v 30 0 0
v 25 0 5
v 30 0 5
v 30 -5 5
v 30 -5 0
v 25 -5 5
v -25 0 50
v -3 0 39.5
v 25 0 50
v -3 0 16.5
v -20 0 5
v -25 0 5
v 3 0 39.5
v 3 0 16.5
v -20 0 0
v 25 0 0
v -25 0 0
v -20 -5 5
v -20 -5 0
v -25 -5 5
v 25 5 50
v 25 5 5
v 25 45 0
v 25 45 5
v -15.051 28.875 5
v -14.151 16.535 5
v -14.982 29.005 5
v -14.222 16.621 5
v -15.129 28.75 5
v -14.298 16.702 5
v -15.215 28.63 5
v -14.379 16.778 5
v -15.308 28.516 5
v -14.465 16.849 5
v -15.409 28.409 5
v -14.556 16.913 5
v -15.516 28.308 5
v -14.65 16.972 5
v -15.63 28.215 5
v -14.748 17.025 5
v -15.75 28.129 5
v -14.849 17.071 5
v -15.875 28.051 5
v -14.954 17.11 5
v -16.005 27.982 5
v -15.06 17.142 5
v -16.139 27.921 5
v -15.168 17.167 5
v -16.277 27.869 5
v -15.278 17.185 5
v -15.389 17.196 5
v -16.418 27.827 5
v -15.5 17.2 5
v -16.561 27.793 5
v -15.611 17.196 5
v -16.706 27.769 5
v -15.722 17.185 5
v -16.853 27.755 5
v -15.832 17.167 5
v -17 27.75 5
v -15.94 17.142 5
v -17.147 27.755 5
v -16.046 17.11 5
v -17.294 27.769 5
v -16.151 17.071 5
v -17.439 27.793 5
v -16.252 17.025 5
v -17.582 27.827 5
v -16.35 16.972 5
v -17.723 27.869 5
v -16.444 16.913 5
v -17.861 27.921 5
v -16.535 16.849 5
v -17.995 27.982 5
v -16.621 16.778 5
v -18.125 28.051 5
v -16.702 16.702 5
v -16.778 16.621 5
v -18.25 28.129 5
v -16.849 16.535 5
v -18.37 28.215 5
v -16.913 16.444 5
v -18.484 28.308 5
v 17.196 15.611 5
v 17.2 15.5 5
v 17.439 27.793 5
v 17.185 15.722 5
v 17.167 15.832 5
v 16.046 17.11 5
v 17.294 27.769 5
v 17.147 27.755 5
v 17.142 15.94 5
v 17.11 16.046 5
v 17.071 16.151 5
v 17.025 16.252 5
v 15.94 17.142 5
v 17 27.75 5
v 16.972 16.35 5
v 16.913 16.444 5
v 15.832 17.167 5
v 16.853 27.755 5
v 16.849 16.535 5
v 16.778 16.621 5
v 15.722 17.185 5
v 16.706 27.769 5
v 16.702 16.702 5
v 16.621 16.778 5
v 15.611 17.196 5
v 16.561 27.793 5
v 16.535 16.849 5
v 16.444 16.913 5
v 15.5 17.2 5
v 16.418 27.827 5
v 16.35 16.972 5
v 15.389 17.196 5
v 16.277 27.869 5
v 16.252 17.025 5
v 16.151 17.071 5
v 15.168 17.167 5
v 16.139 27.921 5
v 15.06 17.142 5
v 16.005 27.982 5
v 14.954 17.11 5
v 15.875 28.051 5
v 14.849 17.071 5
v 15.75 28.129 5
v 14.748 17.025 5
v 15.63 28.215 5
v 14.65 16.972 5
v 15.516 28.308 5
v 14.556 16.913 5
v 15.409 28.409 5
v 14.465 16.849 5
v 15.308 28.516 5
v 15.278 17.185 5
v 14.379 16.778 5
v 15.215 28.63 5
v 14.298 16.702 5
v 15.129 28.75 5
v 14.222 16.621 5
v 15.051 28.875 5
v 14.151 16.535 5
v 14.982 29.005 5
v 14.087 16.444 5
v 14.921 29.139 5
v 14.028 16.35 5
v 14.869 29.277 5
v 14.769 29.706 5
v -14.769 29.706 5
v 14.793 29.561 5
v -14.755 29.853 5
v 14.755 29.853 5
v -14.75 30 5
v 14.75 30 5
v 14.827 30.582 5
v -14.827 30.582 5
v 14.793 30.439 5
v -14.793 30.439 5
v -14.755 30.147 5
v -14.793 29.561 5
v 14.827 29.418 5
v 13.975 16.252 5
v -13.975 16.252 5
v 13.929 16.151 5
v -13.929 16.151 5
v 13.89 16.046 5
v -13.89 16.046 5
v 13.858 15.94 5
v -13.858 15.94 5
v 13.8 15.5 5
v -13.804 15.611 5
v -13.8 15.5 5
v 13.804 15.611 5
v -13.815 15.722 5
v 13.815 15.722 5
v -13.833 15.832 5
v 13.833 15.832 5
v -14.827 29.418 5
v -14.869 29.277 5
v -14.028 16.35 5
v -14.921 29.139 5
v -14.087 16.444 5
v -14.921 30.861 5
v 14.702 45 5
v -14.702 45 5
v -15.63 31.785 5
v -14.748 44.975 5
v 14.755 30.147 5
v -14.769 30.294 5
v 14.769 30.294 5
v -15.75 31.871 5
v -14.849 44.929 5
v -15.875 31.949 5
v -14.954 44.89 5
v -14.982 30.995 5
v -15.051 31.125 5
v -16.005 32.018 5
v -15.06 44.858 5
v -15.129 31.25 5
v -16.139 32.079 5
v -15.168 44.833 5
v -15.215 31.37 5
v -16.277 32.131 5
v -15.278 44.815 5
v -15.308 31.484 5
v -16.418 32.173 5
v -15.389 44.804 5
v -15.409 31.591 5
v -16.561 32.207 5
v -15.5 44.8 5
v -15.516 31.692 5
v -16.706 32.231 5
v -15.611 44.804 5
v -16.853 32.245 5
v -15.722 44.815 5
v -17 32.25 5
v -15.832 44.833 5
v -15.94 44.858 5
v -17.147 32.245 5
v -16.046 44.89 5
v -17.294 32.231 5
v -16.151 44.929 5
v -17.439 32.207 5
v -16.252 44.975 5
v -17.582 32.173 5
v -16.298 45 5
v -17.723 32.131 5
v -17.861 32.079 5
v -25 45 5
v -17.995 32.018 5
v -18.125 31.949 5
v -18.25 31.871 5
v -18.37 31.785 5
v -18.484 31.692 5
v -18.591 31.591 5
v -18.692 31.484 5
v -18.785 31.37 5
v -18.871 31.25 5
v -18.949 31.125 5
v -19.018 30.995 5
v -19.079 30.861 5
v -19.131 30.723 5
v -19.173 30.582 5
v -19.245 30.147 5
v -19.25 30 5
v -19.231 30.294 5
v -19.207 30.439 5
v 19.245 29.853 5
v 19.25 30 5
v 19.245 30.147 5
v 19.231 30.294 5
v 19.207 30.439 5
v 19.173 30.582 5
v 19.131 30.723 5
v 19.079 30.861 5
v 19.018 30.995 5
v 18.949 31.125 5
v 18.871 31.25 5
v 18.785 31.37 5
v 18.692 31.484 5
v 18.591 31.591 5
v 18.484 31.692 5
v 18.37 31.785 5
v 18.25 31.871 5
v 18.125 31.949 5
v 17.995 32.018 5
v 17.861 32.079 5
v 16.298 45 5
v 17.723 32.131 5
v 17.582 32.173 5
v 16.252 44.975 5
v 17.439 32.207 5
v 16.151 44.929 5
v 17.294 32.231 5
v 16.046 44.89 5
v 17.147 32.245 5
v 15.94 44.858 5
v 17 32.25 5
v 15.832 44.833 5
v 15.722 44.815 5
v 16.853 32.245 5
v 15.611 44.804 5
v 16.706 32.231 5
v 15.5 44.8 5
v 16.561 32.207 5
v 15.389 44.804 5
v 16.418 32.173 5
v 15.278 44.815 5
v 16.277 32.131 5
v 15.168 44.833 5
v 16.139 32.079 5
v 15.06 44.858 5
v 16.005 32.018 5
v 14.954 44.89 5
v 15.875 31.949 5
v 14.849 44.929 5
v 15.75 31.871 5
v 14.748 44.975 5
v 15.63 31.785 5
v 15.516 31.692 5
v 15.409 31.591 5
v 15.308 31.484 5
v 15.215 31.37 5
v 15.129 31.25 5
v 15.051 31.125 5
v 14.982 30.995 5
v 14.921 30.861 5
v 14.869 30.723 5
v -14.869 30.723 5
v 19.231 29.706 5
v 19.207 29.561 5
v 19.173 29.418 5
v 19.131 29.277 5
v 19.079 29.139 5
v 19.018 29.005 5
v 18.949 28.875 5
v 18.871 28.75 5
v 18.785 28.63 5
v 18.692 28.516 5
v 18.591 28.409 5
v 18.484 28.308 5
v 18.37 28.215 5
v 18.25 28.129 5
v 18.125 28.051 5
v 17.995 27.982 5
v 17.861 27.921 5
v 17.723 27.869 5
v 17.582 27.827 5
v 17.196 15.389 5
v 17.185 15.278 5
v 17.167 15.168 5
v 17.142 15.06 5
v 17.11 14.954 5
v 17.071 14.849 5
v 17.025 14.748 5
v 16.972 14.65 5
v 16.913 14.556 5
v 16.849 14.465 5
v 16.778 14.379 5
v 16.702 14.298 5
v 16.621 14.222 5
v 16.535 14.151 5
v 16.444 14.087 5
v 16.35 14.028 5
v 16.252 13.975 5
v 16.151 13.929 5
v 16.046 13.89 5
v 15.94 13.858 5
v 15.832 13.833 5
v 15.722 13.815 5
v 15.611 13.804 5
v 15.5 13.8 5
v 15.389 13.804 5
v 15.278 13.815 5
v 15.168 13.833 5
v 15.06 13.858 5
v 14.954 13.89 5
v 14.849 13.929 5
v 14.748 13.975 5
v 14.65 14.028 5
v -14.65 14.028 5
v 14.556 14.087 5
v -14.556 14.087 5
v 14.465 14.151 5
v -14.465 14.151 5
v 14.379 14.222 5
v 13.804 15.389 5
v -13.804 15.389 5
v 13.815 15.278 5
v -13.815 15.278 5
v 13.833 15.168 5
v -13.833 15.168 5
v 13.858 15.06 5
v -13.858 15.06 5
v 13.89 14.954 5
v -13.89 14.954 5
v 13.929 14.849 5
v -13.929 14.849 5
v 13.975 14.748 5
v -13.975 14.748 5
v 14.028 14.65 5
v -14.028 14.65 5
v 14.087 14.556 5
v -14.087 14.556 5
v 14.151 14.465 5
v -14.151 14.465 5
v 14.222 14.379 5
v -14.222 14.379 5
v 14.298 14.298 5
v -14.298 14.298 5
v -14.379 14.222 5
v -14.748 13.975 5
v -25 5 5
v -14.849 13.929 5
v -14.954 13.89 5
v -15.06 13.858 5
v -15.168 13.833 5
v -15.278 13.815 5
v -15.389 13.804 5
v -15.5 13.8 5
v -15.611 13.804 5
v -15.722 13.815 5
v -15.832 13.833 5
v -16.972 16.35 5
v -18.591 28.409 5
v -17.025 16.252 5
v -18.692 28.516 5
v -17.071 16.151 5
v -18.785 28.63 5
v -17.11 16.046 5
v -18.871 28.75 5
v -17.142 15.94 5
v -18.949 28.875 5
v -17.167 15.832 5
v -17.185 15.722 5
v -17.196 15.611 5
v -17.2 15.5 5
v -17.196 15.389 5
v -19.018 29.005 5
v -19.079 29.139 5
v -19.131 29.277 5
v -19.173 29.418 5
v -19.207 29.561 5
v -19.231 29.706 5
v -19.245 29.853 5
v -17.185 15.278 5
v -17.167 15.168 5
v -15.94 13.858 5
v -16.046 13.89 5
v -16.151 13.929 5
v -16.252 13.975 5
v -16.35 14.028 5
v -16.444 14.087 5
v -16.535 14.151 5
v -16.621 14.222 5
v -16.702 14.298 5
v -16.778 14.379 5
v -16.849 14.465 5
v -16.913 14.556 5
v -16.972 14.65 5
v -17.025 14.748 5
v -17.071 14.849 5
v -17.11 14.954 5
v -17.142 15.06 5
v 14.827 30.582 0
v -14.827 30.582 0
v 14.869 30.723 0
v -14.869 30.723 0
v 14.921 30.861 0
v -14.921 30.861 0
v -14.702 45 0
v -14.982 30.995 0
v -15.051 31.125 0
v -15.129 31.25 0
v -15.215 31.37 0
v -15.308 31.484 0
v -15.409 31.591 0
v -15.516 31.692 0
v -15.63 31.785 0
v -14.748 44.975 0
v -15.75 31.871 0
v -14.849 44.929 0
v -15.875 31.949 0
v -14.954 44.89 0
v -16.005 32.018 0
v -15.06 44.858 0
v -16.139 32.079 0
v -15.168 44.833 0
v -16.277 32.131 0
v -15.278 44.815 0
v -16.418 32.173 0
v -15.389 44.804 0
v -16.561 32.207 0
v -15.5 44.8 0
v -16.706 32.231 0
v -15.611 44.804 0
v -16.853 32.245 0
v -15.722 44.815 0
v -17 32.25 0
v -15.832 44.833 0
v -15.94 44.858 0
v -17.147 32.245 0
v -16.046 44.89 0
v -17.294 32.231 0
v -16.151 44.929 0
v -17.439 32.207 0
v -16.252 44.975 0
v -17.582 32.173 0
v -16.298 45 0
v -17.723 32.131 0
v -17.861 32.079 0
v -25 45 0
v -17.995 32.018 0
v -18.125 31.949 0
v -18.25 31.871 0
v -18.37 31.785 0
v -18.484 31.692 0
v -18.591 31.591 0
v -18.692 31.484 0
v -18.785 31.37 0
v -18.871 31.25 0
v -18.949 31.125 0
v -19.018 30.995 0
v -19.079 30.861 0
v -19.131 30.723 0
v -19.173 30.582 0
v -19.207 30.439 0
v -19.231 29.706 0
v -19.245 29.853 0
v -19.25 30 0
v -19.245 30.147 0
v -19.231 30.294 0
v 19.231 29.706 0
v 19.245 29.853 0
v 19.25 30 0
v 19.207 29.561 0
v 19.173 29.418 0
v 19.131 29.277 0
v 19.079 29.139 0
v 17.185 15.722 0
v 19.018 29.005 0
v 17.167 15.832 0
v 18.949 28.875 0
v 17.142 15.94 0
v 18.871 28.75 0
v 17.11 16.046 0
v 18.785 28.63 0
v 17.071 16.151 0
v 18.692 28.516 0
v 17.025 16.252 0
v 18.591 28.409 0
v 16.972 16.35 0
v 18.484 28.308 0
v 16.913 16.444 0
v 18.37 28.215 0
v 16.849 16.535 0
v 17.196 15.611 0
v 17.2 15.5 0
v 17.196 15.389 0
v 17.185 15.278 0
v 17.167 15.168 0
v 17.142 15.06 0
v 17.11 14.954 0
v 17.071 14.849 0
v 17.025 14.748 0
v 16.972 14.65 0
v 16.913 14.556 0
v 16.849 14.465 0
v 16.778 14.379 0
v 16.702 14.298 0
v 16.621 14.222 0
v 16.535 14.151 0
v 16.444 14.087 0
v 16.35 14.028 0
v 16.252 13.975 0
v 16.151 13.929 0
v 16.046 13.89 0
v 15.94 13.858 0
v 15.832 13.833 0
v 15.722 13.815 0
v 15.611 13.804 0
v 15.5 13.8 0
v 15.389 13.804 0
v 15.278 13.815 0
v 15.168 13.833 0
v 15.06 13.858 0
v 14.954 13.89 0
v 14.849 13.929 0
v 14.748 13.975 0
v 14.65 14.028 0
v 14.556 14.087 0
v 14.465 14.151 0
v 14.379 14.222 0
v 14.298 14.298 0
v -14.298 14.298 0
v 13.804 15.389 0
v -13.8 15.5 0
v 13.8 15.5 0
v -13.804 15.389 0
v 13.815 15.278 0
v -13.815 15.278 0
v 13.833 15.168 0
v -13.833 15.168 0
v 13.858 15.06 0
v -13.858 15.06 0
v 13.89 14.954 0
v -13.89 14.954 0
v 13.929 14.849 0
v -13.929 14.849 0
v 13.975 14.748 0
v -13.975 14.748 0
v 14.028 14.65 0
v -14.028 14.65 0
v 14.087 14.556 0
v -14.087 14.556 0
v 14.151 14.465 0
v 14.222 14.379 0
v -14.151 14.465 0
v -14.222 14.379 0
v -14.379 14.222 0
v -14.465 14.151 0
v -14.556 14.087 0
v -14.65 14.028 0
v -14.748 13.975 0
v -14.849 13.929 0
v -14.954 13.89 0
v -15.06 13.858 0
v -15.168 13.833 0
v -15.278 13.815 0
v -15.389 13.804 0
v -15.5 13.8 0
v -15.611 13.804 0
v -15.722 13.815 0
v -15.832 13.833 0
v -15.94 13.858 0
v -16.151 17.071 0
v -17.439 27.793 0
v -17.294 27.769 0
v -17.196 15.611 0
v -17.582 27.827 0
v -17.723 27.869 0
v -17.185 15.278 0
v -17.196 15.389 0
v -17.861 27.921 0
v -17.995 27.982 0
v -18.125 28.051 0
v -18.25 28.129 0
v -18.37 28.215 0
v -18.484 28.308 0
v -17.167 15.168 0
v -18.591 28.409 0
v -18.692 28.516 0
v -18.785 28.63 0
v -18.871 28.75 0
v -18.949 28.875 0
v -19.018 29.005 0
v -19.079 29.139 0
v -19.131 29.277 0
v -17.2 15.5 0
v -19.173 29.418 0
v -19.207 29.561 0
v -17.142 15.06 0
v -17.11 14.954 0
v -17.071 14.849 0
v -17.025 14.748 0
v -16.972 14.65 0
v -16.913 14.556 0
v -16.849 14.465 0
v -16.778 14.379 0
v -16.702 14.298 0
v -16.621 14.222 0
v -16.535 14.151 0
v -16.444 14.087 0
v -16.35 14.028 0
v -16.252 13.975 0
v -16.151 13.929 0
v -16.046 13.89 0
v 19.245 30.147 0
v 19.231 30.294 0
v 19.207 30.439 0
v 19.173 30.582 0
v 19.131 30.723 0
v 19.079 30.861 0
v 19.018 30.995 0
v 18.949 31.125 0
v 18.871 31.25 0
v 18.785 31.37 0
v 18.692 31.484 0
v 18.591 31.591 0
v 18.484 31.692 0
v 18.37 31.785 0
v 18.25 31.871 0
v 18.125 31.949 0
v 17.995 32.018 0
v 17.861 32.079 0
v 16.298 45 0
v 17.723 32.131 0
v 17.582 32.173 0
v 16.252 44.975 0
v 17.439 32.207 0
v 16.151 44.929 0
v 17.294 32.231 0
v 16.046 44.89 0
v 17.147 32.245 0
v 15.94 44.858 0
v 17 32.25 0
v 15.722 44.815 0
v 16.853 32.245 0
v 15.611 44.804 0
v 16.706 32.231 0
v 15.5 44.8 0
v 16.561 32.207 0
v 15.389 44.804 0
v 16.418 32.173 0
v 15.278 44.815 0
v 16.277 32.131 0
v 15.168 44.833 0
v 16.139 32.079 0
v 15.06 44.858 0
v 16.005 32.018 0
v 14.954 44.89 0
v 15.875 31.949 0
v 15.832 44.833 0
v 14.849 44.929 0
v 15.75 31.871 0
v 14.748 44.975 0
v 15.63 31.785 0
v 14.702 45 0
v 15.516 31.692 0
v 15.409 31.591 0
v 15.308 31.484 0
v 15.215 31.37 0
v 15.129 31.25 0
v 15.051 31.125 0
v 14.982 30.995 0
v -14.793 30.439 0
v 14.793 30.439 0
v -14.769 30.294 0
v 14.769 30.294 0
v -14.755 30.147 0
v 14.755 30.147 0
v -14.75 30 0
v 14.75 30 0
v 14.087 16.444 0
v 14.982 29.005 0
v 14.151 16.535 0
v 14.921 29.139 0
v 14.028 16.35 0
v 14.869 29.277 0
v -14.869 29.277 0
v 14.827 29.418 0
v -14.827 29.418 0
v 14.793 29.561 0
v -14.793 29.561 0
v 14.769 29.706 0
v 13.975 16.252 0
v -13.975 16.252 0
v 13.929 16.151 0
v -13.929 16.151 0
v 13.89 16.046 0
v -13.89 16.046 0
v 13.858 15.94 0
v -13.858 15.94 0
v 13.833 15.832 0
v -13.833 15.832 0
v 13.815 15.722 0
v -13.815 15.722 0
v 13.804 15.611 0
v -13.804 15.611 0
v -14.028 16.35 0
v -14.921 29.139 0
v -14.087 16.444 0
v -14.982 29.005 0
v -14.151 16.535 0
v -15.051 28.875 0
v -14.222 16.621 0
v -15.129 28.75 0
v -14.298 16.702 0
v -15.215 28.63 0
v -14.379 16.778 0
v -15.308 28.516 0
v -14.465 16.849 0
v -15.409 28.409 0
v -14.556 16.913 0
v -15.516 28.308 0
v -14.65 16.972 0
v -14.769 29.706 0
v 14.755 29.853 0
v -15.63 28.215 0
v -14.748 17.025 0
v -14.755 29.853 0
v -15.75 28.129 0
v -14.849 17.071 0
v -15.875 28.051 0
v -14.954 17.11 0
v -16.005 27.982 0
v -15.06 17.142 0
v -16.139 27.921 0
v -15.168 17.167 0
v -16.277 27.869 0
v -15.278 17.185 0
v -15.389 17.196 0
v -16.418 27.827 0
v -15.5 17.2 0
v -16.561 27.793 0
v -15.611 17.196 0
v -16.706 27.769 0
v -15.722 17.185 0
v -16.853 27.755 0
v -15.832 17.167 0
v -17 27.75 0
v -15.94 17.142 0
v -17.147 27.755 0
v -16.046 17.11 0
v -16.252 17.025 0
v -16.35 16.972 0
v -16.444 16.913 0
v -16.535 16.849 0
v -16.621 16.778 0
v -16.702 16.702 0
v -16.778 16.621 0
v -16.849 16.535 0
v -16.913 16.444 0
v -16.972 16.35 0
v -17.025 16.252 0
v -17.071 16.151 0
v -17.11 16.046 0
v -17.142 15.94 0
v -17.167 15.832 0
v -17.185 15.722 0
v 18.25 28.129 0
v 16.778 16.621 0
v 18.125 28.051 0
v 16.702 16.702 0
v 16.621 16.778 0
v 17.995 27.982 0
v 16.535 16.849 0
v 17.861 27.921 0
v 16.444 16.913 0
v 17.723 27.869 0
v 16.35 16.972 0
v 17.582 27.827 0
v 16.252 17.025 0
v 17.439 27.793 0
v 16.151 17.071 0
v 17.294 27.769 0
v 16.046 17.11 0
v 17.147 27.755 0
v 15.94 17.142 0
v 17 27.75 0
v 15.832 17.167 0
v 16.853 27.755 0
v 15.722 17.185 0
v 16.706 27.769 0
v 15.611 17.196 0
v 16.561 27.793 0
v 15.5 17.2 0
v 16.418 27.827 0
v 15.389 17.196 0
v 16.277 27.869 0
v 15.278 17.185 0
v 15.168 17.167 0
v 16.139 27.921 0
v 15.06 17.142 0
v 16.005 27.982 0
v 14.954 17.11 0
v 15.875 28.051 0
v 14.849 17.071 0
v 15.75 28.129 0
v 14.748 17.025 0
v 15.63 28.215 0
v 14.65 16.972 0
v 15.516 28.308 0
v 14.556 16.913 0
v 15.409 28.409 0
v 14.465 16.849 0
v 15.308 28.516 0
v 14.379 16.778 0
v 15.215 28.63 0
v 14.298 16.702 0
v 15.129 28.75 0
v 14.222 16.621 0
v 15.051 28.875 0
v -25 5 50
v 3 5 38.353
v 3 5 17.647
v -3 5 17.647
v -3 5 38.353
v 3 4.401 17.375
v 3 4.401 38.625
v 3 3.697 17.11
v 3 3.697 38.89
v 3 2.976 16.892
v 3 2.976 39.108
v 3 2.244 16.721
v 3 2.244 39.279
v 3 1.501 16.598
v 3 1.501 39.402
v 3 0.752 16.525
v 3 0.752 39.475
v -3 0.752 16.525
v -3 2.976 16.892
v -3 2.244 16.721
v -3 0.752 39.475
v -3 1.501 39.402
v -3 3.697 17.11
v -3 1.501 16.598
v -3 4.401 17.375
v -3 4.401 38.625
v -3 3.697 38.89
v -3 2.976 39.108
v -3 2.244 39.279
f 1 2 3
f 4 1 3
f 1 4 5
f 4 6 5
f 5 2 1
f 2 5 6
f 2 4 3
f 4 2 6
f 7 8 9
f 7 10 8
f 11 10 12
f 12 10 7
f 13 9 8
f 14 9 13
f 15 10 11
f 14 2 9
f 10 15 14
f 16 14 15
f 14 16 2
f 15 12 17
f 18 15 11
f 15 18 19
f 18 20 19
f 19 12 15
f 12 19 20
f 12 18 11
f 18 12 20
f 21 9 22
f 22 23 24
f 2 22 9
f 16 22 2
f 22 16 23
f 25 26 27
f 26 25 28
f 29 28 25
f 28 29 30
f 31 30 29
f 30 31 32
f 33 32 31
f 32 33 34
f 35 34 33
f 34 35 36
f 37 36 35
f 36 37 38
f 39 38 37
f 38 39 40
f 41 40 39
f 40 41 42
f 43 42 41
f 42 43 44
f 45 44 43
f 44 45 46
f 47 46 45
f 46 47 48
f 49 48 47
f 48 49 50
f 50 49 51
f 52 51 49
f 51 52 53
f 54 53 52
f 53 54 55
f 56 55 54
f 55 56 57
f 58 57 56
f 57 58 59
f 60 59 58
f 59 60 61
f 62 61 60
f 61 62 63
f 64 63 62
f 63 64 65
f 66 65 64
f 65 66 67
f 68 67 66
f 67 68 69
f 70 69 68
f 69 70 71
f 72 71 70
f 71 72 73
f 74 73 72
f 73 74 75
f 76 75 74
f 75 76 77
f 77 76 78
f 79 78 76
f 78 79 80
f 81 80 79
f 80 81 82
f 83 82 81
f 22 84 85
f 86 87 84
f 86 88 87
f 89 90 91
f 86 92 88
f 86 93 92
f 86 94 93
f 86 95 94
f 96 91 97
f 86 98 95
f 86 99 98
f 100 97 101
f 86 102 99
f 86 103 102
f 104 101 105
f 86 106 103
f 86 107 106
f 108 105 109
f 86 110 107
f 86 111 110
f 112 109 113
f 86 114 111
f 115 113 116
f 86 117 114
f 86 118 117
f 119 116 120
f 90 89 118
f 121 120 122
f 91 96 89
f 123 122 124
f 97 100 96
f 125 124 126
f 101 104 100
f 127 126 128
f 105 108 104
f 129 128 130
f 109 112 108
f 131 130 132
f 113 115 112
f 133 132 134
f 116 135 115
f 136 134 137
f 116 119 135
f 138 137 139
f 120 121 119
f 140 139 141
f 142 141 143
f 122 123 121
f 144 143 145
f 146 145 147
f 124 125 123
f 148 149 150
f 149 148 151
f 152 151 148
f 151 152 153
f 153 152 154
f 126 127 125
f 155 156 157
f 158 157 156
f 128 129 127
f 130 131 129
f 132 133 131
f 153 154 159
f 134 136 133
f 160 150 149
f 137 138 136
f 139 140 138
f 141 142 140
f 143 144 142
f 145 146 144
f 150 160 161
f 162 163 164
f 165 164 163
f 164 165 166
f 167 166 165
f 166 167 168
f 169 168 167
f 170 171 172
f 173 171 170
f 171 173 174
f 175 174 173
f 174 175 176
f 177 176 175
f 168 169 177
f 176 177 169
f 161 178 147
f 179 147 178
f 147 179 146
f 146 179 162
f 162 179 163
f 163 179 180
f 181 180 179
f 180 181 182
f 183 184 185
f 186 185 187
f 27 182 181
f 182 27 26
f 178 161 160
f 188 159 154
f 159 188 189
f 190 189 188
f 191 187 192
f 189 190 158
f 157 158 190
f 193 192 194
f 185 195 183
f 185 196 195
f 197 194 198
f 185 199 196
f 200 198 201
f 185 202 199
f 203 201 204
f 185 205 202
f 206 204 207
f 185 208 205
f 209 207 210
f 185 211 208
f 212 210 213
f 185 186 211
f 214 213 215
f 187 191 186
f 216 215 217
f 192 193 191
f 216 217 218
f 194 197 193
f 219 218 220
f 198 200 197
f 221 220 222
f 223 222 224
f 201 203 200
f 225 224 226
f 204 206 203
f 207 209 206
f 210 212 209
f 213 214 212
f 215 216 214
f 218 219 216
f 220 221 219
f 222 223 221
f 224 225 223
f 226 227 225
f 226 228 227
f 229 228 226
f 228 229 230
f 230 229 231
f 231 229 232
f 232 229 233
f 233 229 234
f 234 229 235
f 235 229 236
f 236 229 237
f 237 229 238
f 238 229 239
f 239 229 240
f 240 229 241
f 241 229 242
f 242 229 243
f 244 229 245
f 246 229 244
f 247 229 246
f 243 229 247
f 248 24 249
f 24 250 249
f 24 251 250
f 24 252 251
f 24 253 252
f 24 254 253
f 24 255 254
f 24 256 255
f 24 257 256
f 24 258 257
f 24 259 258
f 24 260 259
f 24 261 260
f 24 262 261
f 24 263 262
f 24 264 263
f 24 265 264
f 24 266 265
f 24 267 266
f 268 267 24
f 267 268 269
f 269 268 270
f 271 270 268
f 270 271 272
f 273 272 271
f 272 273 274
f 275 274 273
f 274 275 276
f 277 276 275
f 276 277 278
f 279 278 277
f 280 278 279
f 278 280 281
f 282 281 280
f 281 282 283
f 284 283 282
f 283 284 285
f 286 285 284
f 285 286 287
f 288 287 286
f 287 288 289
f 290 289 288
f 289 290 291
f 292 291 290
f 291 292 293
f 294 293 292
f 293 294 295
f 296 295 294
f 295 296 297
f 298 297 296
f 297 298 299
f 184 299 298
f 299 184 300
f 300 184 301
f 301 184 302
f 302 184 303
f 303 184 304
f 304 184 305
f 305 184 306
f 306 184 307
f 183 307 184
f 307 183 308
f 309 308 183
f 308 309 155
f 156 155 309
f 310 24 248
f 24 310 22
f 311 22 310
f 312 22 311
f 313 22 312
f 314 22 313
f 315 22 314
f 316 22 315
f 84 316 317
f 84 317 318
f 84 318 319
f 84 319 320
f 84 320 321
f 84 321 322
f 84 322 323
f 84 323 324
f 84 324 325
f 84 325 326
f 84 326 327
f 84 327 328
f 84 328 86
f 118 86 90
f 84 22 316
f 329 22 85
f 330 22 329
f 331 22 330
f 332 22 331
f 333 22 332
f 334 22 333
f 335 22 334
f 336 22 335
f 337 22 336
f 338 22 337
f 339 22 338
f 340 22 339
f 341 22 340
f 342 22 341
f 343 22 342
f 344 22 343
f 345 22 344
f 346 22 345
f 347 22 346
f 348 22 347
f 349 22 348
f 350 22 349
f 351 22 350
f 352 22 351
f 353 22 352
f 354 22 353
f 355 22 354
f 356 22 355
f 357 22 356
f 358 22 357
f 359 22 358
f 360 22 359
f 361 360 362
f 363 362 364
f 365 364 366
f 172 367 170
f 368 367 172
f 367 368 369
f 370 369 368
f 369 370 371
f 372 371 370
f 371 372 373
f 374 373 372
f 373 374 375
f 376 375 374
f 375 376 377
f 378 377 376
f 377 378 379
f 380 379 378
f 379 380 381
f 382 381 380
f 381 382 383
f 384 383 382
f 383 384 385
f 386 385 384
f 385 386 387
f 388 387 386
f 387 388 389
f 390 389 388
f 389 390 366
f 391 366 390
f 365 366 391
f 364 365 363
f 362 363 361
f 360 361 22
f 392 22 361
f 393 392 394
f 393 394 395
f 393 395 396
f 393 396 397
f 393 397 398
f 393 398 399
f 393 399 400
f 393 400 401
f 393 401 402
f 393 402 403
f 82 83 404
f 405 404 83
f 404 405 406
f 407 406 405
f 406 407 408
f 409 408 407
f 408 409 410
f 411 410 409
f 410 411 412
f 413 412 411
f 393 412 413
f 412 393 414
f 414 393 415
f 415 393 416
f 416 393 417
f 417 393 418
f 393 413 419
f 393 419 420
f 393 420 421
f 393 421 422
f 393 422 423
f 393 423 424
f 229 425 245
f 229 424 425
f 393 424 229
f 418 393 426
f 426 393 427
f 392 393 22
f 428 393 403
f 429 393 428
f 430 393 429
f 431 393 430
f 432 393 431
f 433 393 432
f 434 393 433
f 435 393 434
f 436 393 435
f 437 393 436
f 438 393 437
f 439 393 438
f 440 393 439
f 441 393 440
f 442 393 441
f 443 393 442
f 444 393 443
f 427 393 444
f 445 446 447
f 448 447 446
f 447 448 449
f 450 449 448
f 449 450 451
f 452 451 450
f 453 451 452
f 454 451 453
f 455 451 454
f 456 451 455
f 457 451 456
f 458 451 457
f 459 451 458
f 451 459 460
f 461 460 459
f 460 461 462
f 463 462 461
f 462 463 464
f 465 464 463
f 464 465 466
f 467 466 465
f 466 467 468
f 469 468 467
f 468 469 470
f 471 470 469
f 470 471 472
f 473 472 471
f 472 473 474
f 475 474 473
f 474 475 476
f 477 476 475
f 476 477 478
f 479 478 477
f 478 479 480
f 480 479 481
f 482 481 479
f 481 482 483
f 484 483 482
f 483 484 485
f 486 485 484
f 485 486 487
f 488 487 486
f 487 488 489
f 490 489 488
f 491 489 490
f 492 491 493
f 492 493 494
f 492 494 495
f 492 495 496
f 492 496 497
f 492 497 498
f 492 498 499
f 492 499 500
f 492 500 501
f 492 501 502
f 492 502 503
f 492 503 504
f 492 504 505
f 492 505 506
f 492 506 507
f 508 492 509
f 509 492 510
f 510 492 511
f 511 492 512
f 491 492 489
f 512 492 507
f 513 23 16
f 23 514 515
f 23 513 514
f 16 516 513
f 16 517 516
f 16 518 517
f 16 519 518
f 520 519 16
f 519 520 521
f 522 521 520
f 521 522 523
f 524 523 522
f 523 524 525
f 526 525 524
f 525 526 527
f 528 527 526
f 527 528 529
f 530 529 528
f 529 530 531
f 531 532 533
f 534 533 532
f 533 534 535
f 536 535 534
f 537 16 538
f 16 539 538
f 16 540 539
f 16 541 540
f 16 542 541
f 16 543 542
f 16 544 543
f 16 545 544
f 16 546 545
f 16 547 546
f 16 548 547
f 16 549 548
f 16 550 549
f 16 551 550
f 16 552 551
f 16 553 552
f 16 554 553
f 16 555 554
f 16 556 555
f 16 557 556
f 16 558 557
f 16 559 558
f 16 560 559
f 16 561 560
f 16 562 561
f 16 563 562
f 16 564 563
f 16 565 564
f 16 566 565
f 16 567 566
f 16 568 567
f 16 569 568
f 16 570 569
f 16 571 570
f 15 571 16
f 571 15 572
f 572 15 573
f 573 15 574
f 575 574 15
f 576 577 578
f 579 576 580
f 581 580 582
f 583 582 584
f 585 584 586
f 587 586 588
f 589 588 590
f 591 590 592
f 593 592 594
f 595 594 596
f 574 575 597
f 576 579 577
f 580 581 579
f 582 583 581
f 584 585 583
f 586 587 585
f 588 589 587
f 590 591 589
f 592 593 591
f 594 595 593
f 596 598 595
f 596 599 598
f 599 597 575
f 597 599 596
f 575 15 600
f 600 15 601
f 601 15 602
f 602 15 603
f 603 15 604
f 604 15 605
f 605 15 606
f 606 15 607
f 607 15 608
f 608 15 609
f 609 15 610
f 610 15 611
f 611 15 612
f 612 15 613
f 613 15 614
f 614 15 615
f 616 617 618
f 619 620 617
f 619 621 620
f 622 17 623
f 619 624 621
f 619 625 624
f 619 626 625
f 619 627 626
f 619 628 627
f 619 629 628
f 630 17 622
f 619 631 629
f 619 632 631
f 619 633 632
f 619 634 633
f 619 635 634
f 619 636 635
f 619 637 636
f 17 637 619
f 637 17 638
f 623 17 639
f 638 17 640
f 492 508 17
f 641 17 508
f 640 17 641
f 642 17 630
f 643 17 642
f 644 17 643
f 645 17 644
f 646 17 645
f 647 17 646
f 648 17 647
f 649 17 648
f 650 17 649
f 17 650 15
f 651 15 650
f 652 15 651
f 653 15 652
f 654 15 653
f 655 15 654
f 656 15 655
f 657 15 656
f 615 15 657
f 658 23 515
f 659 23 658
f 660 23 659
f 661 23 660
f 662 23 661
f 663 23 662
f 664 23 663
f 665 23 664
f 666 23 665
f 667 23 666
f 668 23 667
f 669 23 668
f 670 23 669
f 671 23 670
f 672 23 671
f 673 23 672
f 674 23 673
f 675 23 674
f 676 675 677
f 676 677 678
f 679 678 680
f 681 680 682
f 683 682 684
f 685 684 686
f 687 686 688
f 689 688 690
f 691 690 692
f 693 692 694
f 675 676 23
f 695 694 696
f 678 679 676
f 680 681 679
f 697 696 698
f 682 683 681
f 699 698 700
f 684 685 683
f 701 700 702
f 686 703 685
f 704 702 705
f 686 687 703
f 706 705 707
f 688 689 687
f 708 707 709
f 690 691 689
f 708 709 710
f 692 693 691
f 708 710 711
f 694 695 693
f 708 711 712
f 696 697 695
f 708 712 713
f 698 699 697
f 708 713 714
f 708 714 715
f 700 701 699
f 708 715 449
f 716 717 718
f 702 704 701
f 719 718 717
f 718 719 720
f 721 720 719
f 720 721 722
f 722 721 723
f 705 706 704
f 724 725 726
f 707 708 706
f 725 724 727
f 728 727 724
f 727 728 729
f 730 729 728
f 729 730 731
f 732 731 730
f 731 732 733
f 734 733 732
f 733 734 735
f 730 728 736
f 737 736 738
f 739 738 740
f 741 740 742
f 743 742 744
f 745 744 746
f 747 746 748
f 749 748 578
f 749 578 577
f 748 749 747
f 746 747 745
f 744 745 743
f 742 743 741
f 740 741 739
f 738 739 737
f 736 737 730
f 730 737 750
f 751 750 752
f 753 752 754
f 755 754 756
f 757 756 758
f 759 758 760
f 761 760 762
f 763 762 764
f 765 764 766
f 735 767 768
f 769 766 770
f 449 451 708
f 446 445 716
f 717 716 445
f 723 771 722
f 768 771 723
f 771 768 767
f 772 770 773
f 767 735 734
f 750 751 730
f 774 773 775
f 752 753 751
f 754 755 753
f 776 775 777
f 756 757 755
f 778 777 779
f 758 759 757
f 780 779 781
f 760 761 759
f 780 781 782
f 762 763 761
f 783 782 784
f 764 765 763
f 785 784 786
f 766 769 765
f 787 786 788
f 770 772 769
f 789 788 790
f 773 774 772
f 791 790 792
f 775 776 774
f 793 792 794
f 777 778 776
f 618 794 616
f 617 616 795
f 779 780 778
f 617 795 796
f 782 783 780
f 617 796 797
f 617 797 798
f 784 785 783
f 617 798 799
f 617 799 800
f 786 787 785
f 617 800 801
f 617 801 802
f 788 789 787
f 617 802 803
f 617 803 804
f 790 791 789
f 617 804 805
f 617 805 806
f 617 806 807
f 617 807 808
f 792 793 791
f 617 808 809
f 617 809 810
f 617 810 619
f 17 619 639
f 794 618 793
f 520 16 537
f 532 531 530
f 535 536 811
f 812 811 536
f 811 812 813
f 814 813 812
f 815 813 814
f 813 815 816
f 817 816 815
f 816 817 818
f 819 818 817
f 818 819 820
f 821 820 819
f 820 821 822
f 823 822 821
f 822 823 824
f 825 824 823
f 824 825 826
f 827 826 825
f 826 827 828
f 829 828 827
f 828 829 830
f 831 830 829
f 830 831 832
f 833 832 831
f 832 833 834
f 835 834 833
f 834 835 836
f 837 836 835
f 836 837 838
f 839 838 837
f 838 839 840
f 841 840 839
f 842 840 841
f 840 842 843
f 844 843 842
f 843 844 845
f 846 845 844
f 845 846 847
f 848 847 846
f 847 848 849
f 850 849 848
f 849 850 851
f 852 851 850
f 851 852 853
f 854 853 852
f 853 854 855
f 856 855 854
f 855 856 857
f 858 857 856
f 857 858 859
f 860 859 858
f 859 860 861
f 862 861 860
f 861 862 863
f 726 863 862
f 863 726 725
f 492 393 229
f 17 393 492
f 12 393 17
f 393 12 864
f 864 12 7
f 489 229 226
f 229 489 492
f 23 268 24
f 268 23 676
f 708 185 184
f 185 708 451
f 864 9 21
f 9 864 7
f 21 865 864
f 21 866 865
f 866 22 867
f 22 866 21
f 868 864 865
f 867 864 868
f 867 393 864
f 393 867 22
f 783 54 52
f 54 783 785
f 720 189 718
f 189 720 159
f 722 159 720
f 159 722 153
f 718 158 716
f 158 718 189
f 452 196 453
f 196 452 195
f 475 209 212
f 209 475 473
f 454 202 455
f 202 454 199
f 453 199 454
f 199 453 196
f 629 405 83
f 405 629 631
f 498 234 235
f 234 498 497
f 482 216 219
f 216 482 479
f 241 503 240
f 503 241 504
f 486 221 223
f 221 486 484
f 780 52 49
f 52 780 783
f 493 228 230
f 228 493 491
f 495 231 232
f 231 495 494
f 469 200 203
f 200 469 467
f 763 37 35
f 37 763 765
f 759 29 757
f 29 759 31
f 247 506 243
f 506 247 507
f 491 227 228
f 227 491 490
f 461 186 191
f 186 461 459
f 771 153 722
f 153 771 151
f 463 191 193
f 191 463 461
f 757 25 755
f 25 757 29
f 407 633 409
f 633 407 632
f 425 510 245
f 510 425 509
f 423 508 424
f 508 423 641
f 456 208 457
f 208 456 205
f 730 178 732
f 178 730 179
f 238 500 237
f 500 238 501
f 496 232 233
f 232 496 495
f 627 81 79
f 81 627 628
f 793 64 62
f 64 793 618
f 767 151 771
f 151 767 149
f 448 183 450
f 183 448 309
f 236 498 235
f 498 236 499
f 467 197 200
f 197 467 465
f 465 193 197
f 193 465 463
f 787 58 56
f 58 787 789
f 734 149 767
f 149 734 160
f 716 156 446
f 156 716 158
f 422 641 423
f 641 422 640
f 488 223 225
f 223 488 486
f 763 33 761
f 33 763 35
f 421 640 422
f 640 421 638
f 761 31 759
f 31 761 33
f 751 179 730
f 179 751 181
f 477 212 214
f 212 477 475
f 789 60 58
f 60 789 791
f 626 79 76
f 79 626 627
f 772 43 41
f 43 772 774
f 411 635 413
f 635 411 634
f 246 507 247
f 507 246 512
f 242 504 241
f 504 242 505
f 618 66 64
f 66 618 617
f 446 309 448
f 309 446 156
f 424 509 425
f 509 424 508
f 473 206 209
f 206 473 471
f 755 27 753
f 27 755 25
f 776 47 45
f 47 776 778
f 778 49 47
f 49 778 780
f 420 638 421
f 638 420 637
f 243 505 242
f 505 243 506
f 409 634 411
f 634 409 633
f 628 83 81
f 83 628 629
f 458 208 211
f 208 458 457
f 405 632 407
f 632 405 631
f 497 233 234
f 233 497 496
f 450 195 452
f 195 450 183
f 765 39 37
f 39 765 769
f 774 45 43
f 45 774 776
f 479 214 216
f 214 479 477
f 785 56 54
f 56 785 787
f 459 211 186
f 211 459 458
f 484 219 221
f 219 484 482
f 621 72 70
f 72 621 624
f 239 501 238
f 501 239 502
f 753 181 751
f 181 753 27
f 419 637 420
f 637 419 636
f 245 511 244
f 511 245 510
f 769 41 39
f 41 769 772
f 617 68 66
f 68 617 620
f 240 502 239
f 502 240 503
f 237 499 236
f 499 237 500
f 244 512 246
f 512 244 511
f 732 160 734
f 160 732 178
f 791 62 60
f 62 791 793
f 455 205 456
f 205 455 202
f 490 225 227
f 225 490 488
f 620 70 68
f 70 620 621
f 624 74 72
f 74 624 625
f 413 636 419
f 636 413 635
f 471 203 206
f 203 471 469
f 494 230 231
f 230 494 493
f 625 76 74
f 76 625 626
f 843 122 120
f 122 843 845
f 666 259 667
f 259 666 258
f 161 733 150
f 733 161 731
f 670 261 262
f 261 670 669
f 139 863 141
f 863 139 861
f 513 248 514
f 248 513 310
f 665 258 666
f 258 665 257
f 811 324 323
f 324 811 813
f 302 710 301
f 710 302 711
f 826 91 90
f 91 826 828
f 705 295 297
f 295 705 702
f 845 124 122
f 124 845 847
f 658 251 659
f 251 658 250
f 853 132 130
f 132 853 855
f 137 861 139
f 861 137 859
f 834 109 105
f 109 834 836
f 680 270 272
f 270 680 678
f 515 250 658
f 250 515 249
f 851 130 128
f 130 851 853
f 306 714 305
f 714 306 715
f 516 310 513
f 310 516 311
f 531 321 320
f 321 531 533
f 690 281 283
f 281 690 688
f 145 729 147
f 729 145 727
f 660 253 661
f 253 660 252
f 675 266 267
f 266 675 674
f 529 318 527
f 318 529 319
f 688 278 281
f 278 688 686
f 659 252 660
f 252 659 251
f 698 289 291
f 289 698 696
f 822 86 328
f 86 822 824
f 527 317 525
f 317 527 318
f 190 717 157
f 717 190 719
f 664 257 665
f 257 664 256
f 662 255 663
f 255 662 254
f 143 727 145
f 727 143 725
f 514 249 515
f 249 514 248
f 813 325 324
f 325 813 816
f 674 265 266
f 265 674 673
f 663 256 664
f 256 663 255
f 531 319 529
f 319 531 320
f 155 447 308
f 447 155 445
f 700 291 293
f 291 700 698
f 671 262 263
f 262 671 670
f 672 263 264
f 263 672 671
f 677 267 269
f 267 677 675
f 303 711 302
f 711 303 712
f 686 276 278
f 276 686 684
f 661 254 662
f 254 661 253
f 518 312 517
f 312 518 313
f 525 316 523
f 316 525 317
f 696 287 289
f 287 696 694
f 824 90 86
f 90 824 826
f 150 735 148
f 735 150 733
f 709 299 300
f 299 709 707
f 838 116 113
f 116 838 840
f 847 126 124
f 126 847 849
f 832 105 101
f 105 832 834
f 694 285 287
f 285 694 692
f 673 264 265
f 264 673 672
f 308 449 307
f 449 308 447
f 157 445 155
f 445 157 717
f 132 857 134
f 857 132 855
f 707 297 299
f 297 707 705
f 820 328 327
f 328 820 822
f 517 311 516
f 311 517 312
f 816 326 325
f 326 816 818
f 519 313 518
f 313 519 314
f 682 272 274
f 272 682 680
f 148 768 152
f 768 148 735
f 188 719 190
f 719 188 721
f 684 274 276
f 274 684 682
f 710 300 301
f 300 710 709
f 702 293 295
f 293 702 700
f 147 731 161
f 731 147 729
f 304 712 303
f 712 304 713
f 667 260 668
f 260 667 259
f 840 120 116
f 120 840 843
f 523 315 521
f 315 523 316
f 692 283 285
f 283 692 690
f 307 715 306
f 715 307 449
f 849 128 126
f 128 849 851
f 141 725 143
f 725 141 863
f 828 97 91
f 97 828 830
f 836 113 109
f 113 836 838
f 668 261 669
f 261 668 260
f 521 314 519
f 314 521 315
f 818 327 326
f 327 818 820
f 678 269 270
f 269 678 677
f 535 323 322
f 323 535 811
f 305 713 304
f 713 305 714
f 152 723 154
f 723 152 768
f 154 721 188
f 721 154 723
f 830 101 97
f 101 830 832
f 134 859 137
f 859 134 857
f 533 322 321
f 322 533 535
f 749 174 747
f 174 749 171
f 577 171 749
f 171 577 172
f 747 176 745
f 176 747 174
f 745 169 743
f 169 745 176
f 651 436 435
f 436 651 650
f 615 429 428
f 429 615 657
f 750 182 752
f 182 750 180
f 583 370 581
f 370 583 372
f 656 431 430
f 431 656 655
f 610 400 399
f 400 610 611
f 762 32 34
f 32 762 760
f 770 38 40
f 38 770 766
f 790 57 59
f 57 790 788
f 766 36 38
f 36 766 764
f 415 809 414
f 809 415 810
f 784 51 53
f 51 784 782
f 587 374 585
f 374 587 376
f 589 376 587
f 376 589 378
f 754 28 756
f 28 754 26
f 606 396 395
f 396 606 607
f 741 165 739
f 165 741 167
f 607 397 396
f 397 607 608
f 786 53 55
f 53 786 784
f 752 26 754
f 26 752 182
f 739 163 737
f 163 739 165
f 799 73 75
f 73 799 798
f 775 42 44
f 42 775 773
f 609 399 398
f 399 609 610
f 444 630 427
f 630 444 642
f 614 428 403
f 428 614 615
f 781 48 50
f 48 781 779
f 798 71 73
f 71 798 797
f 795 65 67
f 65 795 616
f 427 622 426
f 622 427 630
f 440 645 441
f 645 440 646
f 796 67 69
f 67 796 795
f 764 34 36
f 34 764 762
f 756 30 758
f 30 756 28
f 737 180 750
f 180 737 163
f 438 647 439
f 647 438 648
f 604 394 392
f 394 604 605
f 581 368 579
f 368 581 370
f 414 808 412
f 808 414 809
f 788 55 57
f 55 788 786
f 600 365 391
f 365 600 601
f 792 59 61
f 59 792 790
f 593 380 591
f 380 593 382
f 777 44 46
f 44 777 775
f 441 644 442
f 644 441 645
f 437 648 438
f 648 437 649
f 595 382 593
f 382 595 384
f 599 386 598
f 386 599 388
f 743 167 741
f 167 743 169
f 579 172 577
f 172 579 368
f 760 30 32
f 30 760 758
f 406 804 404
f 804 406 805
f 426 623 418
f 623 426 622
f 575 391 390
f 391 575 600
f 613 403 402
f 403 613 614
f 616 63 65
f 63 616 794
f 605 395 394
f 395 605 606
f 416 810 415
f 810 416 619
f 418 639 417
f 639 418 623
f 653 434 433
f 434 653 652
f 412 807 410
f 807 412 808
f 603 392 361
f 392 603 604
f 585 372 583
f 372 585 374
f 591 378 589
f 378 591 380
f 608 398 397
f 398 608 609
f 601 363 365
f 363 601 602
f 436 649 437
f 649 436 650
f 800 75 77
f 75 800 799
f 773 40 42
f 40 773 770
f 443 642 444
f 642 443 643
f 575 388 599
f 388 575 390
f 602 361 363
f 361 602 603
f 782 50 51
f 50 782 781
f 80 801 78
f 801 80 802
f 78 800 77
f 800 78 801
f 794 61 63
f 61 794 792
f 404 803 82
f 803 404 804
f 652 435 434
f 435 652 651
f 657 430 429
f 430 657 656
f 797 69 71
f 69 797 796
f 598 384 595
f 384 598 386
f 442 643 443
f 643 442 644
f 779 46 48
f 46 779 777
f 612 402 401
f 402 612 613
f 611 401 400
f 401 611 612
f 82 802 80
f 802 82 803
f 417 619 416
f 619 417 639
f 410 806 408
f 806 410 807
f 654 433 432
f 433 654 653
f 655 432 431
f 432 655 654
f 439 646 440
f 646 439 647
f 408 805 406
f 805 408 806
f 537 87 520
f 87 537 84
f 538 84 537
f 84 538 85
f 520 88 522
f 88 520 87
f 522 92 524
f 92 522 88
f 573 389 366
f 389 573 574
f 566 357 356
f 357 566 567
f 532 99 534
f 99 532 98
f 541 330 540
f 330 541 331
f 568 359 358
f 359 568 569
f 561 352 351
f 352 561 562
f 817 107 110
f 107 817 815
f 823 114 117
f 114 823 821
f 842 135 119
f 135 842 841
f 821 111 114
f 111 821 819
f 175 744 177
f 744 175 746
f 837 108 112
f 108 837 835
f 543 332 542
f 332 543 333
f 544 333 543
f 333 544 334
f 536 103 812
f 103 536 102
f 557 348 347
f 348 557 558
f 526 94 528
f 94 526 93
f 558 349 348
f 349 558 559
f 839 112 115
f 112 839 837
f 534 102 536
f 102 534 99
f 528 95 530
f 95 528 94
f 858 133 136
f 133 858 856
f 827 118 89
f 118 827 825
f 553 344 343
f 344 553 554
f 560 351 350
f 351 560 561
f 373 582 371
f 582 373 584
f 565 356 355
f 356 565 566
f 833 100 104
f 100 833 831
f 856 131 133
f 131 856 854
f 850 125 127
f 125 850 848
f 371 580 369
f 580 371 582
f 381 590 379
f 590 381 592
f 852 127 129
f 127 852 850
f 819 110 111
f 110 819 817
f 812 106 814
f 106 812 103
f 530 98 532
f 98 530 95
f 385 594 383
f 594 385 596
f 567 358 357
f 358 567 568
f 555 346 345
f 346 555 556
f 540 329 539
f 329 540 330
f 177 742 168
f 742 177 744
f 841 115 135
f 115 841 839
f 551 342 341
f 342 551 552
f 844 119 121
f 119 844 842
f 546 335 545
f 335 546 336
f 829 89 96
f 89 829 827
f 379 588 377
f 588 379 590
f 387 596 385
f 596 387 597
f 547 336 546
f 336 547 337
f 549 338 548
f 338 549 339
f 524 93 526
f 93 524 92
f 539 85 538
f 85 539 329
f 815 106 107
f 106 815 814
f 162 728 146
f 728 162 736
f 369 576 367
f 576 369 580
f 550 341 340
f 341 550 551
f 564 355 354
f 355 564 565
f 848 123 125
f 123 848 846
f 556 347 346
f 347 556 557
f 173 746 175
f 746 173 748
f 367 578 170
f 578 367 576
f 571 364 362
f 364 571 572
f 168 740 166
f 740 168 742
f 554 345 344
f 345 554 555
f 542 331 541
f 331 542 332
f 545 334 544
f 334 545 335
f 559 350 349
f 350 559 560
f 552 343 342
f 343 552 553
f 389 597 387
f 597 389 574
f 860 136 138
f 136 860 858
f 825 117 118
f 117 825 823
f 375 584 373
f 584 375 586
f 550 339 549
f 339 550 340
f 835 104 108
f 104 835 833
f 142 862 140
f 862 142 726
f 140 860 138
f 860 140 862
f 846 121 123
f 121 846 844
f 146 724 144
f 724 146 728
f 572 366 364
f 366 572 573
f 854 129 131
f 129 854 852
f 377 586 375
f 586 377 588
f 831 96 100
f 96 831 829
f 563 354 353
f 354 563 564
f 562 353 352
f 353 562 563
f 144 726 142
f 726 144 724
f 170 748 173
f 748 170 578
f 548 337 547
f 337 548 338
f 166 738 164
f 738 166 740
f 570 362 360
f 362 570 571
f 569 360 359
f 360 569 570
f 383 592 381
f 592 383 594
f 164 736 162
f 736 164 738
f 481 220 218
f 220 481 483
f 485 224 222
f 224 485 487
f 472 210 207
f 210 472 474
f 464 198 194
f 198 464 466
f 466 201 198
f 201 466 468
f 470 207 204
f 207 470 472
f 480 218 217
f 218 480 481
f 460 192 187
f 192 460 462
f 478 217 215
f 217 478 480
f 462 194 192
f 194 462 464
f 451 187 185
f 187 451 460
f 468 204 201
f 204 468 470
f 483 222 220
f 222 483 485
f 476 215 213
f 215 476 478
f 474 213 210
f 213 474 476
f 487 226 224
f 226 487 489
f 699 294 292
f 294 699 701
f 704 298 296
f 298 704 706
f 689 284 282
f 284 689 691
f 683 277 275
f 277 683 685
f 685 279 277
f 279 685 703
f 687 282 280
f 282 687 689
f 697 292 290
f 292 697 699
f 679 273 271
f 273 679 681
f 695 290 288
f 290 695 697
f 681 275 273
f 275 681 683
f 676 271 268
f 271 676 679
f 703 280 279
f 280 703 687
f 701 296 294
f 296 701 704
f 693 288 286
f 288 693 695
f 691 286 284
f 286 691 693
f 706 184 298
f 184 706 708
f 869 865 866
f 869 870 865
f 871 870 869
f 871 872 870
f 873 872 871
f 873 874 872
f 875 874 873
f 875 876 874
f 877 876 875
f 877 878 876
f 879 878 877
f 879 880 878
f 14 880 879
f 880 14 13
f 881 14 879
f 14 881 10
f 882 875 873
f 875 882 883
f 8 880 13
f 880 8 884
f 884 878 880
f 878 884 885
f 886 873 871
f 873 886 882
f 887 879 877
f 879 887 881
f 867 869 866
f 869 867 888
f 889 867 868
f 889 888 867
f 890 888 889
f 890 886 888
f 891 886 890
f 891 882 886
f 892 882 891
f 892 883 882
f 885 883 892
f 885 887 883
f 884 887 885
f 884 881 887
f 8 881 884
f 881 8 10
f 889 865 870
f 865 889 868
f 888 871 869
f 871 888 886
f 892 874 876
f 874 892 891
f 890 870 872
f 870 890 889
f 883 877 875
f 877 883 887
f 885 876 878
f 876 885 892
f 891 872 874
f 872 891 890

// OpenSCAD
// L-shaped mounting bracket for NEMA 17 stepper motor
// Print orientation: base plate on bed (z = 0), motor plate builds upward (+Z)
// Positioned per user coordinates (x -25 to 25, y 0 to 45), not centred

// ---------------- Parameters ----------------
base_x0      = -25;   // base plate x start
base_x1      = 25;    // base plate x end
base_y0      = 0;     // base plate y start
base_y1      = 45;    // base plate y end
base_z0      = 0;     // base plate z start
base_z1      = 5;     // base plate z end

hole_m4_x    = -17;   // M4 through-hole x position (left)
hole_m4_y    = 30;    // M4 through-hole y position
hole_m4_d    = 4.5;   // M4 through-hole diameter

hole_m4_x2   = 17;    // M4 through-hole x position (right)

motor_x0     = -25;   // motor plate x start
motor_x1     = 25;    // motor plate x end
motor_y0     = 0;     // motor plate y start
motor_y1     = 5;     // motor plate y end
motor_z0     = 0;     // motor plate z start (on base top)
motor_z1     = 50;    // motor plate z end

boss_d       = 23;    // motor centring boss hole diameter
boss_x       = 0;     // boss hole x centre
boss_z       = 28;    // boss hole z centre

screw_d      = 3.4;   // M3 screw hole diameter
screw_n      = 4;     // number of screw holes
screw_a      = 31;    // square pattern size (centre to centre)

gusset_t     = 5;     // gusset thickness (along X)
gusset_x0    = -25;   // left gusset x start
gusset_x1    = -20;   // left gusset x end
gusset_y1    = 5;     // gusset Y leg end
gusset_z1    = 5;     // gusset Z leg end

eps          = 0.5;   // cutter overshoot past faces

$fn = 96;             // curve resolution

// ---------------- Model ----------------
difference() {
    union() {
        // Base plate
        translate([base_x0, base_y0, base_z0])
            cube([base_x1 - base_x0, base_y1 - base_y0, base_z1 - base_z0]);

        // Vertical motor plate, standing on back edge of base
        translate([motor_x0, motor_y0, motor_z0])
            cube([motor_x1 - motor_x0, motor_y1 - motor_y0, motor_z1 - motor_z0]);

        // Triangular gussets, flush with left and right edges
        for (sx = [-1, 1]) {
            translate([sx * gusset_x0, 0, 0])
                rotate([90, 0, 0])
                    linear_extrude(height = gusset_t)
                        polygon(points = [
                            [gusset_y1, 0],
                            [gusset_y1, gusset_z1],
                            [0, gusset_z1]
                        ]);
        }
    }

    // Base plate through-holes (M4)
    for (hx = [hole_m4_x, hole_m4_x2]) {
        translate([hx, hole_m4_y, -eps])
            cylinder(d = hole_m4_d, h = base_z1 - base_z0 + 2 * eps);
    }

    // Motor plate boss hole (along Y)
    translate([boss_x, 0, boss_z])
        rotate([0, 90, 0])
            cylinder(d = boss_d, h = motor_y1 - motor_y0 + 2 * eps, center = true);

    // M3 screw holes on square pattern, centred on boss hole
    for (i = [0 : screw_n - 1]) {
        for (j = [0 : screw_n - 1]) {
            x = (j - (screw_n - 1) / 2) * screw_a;
            y = (i - (screw_n - 1) / 2) * screw_a;
            translate([x, y, -eps])
                cylinder(d = screw_d, h = motor_z1 - motor_z0 + 2 * eps);
        }
    }
}
